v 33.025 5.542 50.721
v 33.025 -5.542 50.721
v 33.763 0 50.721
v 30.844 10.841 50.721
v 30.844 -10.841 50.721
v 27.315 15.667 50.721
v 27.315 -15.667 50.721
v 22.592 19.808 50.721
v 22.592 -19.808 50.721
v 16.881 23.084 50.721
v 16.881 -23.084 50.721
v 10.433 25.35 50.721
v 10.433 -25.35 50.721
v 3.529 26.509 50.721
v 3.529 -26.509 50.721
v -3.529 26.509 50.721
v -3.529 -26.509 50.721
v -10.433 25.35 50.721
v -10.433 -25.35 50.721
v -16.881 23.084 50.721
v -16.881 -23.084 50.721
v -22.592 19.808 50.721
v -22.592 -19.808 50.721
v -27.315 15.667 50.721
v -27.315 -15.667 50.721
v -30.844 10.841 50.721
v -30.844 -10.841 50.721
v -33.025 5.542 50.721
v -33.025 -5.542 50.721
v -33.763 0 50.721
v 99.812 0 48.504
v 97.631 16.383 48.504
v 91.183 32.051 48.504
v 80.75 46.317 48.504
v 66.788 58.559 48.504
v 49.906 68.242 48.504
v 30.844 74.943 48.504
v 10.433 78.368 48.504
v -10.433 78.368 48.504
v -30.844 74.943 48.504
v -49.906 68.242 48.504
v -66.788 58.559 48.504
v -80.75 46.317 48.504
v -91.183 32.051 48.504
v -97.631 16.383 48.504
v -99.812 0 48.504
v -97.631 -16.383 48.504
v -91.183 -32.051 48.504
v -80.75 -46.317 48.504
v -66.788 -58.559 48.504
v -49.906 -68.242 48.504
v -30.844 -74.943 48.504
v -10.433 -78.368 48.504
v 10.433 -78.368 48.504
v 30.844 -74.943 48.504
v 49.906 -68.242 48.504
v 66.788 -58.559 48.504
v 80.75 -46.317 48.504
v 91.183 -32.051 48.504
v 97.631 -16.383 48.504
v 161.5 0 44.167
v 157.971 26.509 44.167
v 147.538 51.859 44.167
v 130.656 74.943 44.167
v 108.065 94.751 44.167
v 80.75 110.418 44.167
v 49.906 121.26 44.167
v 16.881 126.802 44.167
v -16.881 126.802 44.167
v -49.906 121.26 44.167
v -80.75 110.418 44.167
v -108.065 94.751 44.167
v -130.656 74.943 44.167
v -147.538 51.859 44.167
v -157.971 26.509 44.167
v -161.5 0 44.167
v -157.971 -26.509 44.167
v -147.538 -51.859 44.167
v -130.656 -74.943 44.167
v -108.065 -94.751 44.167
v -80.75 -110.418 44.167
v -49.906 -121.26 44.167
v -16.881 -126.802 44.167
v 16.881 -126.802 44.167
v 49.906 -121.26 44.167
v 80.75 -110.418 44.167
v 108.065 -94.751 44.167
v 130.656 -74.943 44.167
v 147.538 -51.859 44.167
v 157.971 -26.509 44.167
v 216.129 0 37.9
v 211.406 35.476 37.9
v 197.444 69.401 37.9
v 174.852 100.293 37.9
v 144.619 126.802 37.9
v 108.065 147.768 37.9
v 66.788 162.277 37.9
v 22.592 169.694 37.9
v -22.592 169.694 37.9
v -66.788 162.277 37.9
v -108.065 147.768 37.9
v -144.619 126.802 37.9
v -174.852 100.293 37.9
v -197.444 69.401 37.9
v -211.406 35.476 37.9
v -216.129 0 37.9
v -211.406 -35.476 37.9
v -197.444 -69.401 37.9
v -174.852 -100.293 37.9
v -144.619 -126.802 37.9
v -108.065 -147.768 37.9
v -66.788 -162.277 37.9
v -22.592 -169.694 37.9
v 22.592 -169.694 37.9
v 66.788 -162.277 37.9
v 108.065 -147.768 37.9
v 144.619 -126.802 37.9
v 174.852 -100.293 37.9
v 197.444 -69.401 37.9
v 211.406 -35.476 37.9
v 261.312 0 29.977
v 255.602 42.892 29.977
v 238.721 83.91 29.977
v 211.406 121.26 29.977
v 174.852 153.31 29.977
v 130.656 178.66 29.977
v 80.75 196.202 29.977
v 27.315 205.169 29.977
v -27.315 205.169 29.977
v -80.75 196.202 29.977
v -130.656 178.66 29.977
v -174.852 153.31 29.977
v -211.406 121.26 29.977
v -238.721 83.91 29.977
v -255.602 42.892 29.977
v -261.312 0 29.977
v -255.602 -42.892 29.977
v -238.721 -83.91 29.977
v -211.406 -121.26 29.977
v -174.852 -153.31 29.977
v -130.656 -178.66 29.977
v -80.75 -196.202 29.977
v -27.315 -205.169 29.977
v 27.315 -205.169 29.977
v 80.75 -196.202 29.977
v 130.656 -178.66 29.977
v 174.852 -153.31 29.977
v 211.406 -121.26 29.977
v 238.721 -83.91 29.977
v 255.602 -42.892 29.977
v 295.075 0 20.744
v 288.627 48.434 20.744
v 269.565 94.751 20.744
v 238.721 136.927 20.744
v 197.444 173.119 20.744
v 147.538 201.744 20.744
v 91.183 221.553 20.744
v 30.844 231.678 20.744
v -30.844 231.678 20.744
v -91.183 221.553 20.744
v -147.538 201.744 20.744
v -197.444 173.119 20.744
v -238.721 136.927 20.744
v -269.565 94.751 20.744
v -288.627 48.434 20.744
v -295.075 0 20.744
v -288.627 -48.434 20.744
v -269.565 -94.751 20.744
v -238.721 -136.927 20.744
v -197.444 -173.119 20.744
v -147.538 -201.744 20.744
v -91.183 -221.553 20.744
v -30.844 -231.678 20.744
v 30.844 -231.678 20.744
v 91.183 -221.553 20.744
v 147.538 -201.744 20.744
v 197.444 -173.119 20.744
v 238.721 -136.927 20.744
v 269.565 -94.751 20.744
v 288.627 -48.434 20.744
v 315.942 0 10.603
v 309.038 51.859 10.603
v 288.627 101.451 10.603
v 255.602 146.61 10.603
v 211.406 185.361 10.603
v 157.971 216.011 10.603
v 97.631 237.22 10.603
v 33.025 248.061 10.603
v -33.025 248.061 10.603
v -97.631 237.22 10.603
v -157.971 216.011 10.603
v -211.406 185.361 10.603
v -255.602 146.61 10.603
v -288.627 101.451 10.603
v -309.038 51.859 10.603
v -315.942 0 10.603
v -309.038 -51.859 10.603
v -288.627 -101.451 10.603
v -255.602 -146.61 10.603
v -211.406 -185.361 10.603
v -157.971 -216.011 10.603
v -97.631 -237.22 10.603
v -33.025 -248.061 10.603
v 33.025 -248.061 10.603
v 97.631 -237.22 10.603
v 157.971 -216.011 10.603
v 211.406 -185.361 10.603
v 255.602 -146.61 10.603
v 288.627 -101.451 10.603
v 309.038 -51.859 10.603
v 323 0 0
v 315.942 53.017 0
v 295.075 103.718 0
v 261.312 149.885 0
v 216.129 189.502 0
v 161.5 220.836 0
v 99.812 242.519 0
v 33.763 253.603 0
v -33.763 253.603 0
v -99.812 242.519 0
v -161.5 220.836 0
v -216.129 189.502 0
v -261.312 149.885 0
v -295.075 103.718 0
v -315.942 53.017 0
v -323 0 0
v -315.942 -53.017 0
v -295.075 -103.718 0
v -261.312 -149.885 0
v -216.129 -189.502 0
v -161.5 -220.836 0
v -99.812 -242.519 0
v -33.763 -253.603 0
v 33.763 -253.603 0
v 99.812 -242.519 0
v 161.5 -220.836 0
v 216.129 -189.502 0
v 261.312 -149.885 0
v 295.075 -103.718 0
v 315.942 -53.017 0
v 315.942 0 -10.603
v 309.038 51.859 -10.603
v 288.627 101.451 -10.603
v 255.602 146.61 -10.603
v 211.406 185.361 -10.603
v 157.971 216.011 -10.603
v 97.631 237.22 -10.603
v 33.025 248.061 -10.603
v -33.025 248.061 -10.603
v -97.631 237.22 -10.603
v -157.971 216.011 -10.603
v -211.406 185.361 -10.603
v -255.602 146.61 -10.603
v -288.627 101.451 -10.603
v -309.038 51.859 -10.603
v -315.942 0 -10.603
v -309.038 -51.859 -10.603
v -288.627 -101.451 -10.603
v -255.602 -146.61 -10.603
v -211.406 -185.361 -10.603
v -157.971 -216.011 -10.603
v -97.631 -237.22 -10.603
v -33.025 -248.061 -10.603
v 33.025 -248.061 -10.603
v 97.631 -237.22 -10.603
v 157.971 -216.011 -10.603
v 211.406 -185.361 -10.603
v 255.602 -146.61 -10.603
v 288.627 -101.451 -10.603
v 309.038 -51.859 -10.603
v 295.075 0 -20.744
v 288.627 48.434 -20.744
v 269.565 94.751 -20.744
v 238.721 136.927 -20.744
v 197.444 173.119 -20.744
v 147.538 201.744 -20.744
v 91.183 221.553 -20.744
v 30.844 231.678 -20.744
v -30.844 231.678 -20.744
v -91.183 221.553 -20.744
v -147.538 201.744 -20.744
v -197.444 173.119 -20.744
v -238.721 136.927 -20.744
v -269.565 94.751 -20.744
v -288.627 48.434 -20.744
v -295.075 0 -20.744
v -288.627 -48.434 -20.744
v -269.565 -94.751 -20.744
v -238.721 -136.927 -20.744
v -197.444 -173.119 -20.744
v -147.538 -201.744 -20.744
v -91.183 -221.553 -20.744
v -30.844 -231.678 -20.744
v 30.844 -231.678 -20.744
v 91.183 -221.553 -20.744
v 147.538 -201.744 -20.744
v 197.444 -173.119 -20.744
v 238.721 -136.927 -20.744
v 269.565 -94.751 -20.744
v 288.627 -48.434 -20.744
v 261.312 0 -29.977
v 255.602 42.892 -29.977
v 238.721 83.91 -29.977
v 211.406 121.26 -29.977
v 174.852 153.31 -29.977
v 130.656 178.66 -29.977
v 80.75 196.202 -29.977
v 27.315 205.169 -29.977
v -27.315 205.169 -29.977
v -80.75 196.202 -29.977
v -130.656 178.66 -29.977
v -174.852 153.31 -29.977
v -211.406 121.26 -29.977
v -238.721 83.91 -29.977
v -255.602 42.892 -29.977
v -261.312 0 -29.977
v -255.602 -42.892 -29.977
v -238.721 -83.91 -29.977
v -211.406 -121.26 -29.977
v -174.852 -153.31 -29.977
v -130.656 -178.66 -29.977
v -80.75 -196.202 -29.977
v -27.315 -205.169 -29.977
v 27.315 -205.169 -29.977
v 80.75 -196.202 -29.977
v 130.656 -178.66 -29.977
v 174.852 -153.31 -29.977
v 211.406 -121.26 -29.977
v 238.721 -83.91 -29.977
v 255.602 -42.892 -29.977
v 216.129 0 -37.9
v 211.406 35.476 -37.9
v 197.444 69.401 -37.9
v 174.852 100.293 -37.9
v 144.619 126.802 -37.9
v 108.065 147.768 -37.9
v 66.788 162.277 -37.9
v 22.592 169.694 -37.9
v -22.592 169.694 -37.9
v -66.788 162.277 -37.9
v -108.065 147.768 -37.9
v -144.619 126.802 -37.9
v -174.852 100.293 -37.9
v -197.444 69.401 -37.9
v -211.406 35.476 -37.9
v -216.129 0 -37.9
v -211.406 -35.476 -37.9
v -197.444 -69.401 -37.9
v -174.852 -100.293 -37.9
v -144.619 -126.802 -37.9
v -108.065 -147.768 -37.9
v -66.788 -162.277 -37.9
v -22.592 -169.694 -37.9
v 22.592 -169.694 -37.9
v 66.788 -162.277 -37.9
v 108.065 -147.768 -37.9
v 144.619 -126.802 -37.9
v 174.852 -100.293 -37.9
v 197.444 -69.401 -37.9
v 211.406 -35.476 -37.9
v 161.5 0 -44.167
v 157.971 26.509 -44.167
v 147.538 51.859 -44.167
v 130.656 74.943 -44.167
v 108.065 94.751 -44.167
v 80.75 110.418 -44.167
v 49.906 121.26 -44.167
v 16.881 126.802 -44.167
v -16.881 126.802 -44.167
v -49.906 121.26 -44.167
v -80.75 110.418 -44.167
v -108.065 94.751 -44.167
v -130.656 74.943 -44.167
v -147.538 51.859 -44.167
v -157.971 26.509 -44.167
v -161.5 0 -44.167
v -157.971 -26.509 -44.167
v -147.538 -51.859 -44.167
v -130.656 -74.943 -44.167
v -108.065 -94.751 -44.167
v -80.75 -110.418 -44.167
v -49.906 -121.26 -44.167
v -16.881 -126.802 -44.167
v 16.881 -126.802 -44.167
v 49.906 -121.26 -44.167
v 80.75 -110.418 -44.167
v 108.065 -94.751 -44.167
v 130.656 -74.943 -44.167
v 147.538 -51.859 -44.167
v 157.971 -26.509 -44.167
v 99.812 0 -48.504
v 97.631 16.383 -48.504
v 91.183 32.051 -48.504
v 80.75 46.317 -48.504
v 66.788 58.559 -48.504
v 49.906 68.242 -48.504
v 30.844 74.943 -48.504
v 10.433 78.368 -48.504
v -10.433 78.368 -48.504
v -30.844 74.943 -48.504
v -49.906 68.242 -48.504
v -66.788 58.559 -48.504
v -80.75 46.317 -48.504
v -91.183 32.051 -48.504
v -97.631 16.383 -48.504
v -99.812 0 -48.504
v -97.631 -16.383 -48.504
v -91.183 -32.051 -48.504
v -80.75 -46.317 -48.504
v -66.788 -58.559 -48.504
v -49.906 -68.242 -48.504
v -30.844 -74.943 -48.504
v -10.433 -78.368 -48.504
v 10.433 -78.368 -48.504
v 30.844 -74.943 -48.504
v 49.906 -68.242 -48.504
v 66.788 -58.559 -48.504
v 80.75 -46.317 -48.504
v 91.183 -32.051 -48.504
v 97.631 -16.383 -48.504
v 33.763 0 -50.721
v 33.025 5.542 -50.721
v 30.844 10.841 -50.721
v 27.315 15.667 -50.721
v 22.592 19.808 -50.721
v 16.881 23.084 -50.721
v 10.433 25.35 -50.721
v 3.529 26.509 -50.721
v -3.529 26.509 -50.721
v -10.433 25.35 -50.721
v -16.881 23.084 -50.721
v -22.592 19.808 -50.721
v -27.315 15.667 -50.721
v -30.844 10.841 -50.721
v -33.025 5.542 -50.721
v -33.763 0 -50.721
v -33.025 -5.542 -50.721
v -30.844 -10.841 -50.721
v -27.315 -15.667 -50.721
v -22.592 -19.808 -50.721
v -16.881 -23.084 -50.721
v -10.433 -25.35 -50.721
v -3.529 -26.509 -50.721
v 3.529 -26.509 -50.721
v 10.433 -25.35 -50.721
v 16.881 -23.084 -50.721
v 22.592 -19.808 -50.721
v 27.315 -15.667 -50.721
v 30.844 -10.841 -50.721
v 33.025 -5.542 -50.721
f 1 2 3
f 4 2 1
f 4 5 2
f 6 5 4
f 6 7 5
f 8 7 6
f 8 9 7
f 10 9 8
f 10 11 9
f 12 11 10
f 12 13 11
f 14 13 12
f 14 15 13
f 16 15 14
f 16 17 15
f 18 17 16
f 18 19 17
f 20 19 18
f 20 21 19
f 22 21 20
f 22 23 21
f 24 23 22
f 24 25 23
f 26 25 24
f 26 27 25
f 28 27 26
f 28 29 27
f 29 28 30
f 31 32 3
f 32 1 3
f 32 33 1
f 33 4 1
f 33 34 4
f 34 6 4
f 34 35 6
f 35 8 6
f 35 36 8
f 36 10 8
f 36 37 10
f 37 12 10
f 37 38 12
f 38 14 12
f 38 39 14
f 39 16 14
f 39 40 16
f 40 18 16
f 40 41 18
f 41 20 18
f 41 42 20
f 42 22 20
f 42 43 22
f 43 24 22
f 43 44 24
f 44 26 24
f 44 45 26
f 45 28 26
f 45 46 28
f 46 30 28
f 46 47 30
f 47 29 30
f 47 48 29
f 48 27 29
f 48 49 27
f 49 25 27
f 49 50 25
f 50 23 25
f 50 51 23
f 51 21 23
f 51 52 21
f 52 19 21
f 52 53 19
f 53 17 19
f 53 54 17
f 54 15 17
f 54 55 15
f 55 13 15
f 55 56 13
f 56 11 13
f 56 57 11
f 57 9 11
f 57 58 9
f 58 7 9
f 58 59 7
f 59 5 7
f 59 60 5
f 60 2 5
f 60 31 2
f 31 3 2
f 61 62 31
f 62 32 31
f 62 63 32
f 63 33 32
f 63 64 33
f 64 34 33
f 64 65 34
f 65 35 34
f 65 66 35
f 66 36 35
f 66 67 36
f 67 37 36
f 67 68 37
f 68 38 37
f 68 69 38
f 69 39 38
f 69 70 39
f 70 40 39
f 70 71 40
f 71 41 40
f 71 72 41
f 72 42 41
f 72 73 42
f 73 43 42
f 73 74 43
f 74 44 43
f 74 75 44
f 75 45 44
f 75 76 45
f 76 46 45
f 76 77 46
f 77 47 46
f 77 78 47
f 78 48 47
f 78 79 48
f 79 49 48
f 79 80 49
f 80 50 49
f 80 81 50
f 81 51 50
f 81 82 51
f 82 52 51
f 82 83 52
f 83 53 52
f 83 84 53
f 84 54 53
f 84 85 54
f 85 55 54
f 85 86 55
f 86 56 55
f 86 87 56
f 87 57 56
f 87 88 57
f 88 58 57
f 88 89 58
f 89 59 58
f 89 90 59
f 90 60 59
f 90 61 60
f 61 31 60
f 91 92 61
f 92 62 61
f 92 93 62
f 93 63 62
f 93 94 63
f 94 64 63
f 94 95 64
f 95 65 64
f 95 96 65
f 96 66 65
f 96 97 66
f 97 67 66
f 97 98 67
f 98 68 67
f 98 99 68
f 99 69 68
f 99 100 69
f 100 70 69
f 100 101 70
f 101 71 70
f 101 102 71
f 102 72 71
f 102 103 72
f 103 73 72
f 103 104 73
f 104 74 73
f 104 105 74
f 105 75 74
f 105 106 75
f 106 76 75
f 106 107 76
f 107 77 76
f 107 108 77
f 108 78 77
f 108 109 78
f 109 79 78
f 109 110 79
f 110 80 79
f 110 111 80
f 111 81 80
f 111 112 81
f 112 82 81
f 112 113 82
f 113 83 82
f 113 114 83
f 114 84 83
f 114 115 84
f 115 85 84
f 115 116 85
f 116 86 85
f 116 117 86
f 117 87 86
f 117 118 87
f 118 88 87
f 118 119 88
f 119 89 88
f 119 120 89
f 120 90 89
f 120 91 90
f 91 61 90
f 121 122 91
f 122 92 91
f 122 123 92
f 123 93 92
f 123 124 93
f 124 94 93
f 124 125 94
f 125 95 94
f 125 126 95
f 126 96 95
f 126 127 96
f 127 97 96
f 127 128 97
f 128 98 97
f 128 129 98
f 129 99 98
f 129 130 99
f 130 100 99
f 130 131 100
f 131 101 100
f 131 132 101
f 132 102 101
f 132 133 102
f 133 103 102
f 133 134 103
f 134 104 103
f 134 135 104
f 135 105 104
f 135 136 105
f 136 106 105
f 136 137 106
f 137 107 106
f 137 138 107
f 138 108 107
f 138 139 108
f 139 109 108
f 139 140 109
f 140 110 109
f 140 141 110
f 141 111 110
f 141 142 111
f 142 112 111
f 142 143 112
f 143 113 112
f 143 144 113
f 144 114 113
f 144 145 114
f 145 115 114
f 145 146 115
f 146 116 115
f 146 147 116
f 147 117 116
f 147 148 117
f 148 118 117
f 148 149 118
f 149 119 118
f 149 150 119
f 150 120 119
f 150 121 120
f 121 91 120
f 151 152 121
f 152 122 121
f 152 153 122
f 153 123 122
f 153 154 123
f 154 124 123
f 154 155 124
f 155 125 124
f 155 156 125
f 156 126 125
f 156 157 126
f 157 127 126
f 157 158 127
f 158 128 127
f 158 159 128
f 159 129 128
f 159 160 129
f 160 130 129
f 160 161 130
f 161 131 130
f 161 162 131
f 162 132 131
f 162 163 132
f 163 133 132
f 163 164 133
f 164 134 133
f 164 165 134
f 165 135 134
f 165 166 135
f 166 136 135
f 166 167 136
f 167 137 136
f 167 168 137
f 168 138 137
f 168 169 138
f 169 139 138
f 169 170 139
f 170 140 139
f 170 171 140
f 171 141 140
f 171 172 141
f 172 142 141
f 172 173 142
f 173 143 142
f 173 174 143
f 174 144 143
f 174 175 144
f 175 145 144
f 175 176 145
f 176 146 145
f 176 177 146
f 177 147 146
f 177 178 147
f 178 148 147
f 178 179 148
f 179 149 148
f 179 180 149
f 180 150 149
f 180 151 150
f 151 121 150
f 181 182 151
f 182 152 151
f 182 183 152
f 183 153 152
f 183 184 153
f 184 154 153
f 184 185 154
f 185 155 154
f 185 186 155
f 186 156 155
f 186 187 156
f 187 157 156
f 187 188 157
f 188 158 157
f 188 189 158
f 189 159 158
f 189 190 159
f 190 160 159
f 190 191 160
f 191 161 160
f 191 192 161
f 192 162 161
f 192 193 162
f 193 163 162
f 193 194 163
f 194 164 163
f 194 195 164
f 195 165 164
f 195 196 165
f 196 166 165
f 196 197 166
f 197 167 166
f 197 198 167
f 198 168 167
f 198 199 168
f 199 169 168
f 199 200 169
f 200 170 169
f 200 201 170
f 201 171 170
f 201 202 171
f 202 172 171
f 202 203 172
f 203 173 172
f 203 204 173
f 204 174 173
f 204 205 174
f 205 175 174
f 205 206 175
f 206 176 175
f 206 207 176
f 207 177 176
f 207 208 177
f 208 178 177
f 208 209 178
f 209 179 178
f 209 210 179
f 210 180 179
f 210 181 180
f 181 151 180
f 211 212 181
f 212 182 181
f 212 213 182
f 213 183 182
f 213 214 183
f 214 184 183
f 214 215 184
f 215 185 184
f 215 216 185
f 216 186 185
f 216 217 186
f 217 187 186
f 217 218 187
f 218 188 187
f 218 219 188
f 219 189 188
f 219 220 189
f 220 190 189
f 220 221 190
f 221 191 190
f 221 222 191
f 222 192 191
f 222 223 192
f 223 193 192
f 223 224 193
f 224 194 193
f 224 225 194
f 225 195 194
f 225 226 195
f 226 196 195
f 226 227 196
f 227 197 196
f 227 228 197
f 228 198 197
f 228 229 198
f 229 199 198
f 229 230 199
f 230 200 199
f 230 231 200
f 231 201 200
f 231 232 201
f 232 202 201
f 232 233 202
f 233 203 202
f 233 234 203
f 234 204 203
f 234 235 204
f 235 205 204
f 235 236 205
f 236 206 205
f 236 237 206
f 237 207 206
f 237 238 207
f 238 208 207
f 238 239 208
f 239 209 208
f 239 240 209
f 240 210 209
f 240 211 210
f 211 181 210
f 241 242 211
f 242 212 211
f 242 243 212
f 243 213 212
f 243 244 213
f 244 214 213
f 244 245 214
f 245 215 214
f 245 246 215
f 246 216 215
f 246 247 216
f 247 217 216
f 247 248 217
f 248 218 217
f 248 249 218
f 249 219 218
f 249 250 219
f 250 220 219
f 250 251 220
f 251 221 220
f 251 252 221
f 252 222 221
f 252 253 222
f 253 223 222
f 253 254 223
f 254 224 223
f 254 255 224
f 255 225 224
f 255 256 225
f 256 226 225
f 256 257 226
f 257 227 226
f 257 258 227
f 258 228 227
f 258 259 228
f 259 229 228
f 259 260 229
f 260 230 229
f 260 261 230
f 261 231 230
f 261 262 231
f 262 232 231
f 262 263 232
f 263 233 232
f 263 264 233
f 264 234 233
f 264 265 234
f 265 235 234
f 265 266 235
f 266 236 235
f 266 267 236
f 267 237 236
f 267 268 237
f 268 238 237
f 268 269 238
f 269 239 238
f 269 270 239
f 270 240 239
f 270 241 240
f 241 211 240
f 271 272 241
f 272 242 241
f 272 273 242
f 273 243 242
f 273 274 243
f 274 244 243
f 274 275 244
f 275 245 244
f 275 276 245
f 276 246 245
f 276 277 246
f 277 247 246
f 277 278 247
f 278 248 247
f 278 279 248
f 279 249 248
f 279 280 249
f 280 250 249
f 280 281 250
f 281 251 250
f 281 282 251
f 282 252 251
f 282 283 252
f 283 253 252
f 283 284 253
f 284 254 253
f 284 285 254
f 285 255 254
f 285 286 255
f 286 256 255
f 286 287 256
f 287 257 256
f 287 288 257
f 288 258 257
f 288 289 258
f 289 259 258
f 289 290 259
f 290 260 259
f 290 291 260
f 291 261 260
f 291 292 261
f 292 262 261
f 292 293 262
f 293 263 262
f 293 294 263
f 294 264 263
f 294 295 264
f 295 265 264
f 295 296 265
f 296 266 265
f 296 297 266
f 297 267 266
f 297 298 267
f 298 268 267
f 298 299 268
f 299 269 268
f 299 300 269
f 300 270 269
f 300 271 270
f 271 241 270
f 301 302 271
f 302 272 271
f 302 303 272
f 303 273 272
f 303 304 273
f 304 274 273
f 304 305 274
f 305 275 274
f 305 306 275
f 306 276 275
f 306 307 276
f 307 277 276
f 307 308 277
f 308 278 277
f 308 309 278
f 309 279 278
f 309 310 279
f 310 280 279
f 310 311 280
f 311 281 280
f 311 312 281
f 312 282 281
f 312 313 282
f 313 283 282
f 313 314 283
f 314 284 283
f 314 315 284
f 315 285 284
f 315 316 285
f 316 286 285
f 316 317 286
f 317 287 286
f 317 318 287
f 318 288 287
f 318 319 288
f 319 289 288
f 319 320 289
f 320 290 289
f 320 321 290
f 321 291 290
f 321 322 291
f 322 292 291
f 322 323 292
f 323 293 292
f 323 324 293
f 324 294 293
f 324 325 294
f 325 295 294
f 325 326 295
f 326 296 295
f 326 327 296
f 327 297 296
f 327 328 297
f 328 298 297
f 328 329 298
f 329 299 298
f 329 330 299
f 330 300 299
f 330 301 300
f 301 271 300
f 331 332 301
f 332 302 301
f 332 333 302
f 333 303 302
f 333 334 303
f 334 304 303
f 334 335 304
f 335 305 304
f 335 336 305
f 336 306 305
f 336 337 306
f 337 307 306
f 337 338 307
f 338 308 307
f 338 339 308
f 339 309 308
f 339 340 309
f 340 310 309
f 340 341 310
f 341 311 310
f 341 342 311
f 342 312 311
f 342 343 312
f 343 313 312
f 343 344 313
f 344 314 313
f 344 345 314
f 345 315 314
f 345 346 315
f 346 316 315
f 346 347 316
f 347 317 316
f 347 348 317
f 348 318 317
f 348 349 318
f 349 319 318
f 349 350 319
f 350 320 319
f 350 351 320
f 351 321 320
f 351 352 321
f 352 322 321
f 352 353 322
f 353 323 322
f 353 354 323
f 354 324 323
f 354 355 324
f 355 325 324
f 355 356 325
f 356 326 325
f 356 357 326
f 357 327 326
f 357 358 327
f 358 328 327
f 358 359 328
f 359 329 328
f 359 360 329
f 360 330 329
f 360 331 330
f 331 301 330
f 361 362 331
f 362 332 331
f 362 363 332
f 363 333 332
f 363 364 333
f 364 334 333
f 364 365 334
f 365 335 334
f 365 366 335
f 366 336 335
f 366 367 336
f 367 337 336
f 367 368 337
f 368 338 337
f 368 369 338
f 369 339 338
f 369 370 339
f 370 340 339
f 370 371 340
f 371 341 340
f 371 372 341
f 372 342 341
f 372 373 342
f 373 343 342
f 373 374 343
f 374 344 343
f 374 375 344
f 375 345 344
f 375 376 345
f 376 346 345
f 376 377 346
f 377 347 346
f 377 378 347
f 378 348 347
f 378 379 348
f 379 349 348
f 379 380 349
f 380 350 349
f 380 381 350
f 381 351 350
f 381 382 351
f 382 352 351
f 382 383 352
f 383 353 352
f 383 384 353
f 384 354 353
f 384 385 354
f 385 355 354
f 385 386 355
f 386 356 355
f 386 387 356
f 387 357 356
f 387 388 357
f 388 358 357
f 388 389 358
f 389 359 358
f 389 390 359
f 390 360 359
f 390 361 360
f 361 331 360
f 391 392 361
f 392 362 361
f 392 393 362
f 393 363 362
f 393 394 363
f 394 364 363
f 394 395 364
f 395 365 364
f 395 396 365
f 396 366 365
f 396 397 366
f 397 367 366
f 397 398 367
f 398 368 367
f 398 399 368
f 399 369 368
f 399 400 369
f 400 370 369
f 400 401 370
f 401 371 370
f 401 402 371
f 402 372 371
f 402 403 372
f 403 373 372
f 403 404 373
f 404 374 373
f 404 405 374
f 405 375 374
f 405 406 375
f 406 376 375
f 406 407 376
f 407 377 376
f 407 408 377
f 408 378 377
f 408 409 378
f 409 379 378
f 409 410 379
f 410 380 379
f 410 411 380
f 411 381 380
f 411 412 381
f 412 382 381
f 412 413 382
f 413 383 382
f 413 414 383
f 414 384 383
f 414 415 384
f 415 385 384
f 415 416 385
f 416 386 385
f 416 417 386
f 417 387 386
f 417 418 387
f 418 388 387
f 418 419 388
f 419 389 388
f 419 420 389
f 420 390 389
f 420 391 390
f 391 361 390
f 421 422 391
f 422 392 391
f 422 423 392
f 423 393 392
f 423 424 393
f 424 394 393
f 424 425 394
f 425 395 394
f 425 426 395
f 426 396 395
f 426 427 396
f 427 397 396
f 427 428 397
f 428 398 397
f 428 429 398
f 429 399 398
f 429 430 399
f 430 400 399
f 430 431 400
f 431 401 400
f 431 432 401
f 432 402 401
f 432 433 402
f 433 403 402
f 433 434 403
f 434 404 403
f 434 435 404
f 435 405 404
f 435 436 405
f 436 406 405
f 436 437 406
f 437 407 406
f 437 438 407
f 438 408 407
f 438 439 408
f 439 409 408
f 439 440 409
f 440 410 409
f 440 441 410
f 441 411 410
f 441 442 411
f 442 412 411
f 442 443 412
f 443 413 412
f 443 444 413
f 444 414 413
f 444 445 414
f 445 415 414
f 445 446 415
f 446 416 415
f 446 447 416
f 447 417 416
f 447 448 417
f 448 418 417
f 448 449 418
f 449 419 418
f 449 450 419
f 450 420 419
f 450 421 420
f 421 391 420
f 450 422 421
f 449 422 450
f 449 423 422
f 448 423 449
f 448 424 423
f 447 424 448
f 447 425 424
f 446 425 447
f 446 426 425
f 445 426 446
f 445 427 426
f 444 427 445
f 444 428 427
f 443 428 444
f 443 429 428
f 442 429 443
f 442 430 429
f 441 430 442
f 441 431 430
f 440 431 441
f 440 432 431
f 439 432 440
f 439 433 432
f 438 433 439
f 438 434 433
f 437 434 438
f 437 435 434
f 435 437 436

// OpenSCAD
// Generated by SolidPython 1.0.1 on 2020-07-29 00:46:54


scale(v = [19, 15, 3]) {
	sphere(r = 17);
}
/***********************************************
*********      SolidPython code:      **********
************************************************
 
# import packages: SolidPython
from solid import *
from solid.utils import *
from itertools import chain, combinations, permutations


class Resize:

    def __init__(self, scad_file):
        self.scad_file = scad_file
        #self.scad_file = import_scad(scad_file)
        # cone/cylinder param:
        self.r1 = 0
        self.r2 = 0
        self.h = 0
        # rectangular prism param:
        self.w = 0
        self.l = 0
        # ellipse param:
        self.r = 0

    # import OpenScad code (file name corresponds to shape)


    # classify shape + parameters
    def assign(self, param1, param2, param3):
        if self.scad_file == 'cone.scad':
            self.r1 = param1
            self.r2 = param2
            self.h = param3
        elif self.scad_file == 'cylinder.scad':
            self.r1 = param1
            self.r2 = param2
            self.h = param3
        elif self.scad_file == 'rectangularPrism.scad':
            self.h = param1
            self.l = param2
            self.w = param3
        else:
            self.r = param1
            self.h = param2

    # resize parameters
    def iterate(self):
        x = range(3, 20, 2)
        i = 1
        if self.scad_file == 'cone.scad':
            tempList = list(permutations(x, 2))
            for temp in tempList:
                param1 = temp[0]
                param2 = temp[1]
                filepath = 'produced_scad_files/' + 'cone' + str(param1) + '_' + str(param2) + '_' + '.scad'
                scad_render_to_file(cylinder(h=param1, r1=param2, r2=0), filepath)

        elif self.scad_file == 'cylinder.scad':
            tempList = list(permutations(x, 3))
            for temp in tempList:
                param1 = temp[0]
                param2 = temp[1]
                filepath = 'produced_scad_files/' + 'cylinder' + str(param1) + '_' + str(param2) + '_' + '.scad'
                scad_render_to_file(cylinder(h=param1, r1=param2, r2=param2), filepath)

        elif self.scad_file == 'rectangularPrism.scad':
            tempList = list(permutations(x, 3))
            for temp in tempList:
                param1 = temp[0]
                param2 = temp[1]
                param3 = temp[2]
                filepath = 'produced_scad_files/' + 'rectangularPrism' + str(param1) + '_' + str(param2) + '_' + str(
                    param3) + '.scad'
                scad_render_to_file(cube(size=(param1, param2, param3)), filepath)

        elif self.scad_file == 'ellipse.scad':
            tempList = list(permutations(x, 4))
            for temp in tempList:
                param1 = temp[0]
                param2 = temp[1]
                param3 = temp[2]
                param4 = temp[3]
                filepath = 'produced_scad_files/' + 'ellipse' + str(param1) + '_' + str(param2) + '_' + str(param3) + '_' + str(param4) + '.scad'
                scad_render_to_file(scale([param1, param2, param3])(sphere(r=param4)), filepath)

    def render_to_scadfile(self):
        scad_render_to_file(scad, 'example.scad') 
 
************************************************/
